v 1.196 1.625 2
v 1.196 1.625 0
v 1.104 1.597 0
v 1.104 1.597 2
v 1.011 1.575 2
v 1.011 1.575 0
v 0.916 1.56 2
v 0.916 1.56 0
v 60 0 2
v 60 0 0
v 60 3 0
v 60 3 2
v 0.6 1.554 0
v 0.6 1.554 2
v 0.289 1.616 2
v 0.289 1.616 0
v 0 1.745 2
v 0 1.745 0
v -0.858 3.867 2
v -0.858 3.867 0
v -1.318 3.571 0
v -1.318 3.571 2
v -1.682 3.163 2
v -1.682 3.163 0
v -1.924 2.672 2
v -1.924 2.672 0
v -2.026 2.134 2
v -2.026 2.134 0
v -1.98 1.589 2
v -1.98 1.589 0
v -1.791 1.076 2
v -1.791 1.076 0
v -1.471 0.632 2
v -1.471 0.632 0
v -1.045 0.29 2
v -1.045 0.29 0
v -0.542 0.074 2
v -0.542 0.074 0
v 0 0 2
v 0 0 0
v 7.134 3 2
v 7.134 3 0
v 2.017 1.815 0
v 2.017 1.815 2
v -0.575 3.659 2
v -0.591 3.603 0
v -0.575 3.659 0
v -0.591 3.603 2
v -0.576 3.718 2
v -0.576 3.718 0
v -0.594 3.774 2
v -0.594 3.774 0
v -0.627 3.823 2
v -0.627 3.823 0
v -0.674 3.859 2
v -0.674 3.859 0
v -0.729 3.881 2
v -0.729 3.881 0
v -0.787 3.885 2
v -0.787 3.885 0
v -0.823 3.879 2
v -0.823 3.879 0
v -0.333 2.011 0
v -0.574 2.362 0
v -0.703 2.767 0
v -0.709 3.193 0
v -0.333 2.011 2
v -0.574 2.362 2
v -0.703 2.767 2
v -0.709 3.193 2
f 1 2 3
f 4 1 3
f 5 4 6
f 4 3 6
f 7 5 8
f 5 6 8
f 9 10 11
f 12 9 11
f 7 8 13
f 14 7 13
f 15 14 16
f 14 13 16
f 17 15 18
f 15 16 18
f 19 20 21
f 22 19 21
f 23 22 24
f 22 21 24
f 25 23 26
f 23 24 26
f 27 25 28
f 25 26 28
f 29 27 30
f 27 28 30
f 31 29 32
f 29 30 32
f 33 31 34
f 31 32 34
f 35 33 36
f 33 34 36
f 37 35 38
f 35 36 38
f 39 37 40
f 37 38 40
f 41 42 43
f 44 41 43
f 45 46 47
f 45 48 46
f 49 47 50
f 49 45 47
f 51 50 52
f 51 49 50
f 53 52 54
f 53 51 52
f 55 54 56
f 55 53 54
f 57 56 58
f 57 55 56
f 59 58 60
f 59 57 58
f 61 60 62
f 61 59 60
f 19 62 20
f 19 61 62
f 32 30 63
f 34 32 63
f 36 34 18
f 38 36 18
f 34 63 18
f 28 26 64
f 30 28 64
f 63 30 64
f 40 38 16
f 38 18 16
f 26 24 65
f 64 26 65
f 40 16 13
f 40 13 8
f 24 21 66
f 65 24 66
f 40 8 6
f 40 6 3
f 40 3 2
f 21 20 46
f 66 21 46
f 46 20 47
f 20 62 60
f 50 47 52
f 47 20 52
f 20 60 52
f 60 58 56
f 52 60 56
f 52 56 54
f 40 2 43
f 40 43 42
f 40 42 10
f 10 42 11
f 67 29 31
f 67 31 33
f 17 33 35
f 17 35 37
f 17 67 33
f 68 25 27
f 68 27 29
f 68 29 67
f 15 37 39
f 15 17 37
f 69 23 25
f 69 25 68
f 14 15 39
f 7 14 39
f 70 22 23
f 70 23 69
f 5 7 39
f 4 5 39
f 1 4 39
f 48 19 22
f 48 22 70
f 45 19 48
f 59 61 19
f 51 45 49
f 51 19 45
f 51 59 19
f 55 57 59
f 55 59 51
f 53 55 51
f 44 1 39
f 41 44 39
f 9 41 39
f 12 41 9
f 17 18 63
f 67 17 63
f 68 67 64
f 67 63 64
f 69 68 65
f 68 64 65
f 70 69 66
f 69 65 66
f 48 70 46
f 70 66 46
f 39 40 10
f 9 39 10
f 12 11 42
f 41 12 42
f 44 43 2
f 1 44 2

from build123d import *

# Parameters (mm, degrees)
F1_DEPTH = 2
F2_R     = 0.2


with BuildPart() as f1:
    # F0 (on Top) → F1 (new body)
    with BuildSketch(Plane.XY):
        with BuildLine():
            ThreePointArc((2.0172090196, 1.8148367186), (1.3567207288, 0.5204837279), (0, 0))
            Line((0, 0), (60, 0))
            Line((60, 0), (60, 3))
            Line((60, 3), (7.1340496652, 3))
            Line((7.1340496652, 3), (2.0172090196, 1.8148367186))
        make_face()
        with BuildLine():
            ThreePointArc((-0.286715437, 4.0366195626), (-2.023394625, 1.8847733915), (0, 0))
            Line((0, 0), (0, 1.744815443))
            ThreePointArc((0, 1.744815443), (-0.710712171, 2.8197388016), (-0.286715437, 4.0366195626))
        make_face()
        with BuildLine():
            Line((0, 1.744815443), (0, 0))
            ThreePointArc((0, 0), (1.3567207288, 0.5204837279), (2.0172090196, 1.8148367186))
            Line((2.0172090196, 1.8148367186), (1.1959759108, 1.6246226015))
            ThreePointArc((1.1959759108, 1.6246226015), (1.0578352718, 1.5853362888), (0.9164894863, 1.5598879203))
            ThreePointArc((0.9164894863, 1.5598879203), (0.4429542769, 1.5765730666), (0, 1.744815443))
        make_face()
    extrude(amount=F1_DEPTH)

    # F2
    f2_edges = [f1.edges().sort_by_distance(p)[0] for p in [
        (-0.286715, 4.03662, 1),
    ]]
    fillet(f2_edges, radius=F2_R)


solid = f1.part
